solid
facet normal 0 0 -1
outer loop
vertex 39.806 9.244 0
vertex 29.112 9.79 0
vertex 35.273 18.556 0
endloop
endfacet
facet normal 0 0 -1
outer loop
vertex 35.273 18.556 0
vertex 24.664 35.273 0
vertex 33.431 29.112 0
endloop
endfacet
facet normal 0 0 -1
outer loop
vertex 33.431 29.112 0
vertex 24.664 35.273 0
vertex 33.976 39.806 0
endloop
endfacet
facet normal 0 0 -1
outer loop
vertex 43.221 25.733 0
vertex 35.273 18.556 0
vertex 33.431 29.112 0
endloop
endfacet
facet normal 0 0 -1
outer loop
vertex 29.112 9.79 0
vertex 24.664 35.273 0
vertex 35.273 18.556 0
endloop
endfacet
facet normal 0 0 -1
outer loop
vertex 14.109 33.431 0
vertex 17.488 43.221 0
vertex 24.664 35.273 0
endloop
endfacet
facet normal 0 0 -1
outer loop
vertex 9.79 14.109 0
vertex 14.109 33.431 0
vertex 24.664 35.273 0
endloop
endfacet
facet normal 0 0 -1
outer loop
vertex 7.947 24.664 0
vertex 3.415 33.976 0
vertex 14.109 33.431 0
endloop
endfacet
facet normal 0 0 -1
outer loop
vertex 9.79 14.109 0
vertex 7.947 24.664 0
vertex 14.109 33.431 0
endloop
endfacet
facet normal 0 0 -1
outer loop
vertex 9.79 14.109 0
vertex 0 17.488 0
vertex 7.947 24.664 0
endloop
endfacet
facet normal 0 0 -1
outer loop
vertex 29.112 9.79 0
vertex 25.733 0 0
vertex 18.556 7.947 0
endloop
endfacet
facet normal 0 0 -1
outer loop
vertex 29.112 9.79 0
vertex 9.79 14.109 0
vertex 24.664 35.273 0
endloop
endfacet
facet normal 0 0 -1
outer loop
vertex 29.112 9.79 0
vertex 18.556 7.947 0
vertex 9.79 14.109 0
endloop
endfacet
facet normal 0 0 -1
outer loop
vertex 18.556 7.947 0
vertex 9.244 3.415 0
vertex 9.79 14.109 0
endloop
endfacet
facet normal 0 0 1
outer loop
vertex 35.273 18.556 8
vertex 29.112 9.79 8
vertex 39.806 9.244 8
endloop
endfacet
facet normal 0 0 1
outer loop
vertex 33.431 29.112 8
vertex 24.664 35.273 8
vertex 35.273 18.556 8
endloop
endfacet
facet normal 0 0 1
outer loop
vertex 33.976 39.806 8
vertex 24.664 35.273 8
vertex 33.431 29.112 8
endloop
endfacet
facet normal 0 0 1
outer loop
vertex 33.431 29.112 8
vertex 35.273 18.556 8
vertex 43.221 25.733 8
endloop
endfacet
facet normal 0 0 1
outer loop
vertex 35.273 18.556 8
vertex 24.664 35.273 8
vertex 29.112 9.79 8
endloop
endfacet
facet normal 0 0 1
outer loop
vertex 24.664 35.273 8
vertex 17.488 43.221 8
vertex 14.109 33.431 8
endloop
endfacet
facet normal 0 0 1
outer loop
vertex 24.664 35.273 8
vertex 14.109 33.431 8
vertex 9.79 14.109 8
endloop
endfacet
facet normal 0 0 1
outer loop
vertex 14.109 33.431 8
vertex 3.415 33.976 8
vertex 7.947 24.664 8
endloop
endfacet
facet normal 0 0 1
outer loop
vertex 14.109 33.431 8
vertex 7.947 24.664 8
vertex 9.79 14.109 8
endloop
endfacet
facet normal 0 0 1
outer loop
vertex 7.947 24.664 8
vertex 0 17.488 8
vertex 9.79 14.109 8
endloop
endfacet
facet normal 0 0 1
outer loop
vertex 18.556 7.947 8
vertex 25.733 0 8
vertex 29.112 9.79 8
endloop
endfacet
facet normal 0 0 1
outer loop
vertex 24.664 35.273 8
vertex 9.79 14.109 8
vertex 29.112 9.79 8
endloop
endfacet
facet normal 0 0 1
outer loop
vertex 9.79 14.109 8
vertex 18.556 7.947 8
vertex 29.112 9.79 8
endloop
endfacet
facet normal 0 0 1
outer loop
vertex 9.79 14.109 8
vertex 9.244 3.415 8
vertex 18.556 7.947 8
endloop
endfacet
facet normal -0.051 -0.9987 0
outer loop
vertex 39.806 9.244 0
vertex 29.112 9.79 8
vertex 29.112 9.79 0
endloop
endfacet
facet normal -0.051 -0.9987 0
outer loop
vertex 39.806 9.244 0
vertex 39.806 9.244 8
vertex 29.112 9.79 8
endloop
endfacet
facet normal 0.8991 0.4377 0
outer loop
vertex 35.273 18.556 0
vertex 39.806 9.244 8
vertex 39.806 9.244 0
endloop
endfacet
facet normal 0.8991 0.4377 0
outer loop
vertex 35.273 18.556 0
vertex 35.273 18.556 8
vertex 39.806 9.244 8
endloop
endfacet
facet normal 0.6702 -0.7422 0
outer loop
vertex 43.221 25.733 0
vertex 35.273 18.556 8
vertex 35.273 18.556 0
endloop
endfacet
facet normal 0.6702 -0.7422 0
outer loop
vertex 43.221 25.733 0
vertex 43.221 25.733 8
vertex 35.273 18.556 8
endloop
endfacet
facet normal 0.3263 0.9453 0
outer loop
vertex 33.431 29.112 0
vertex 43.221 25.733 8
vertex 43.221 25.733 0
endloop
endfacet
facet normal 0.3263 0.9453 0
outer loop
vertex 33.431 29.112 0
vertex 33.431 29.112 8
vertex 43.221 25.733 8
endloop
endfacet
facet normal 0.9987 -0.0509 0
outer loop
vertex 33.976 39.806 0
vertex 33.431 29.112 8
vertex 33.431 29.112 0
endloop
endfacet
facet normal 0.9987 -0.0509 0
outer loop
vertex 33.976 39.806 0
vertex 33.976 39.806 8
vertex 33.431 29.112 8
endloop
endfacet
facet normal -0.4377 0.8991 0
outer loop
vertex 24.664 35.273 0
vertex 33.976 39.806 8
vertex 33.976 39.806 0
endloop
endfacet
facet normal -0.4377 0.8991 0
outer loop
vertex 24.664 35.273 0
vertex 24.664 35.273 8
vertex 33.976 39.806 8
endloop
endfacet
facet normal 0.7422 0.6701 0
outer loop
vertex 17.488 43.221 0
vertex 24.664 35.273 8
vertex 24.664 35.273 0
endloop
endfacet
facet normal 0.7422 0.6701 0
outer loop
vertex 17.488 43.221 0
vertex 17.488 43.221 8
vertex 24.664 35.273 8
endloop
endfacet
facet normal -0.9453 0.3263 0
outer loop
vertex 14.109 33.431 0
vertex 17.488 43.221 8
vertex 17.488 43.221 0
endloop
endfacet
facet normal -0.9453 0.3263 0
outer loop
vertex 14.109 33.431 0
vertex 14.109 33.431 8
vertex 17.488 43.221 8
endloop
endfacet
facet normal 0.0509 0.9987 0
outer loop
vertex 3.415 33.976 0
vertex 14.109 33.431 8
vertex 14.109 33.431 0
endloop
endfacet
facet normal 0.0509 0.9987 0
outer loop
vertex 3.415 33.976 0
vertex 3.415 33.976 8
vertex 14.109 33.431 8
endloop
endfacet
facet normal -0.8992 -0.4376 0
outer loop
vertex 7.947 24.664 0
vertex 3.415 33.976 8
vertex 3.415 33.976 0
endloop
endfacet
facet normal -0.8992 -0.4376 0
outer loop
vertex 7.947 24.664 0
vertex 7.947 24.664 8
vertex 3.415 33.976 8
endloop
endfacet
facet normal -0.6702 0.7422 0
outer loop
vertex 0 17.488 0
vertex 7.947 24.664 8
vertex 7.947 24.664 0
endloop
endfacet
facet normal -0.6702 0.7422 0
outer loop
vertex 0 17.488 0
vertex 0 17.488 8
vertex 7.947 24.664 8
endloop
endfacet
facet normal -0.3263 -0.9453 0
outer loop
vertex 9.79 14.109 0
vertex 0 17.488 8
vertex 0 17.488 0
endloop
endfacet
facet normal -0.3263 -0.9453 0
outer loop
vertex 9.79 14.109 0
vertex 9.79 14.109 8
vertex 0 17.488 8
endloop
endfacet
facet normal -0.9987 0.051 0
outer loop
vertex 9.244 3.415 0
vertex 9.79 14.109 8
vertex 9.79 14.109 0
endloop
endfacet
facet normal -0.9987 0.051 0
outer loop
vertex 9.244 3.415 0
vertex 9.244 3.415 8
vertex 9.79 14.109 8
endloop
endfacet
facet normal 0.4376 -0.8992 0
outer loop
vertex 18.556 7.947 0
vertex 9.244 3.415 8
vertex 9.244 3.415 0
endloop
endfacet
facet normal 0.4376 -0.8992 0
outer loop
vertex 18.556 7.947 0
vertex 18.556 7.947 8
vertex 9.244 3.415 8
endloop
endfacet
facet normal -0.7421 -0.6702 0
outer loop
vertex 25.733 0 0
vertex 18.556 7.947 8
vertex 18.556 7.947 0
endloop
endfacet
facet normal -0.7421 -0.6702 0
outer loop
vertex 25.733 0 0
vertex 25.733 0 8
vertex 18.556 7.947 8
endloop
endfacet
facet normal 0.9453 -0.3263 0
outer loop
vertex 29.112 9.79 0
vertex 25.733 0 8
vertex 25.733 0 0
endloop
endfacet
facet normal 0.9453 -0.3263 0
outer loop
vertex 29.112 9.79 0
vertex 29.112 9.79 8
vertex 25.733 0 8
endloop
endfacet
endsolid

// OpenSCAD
$fn = 32;

// ----------------------------------------------------------------------
// Chain sprocket: 8 teeth, 14 mm root radius
// ----------------------------------------------------------------------

// --- parameters (mm) ---
profile_height = 8;       // extrusion height
profile_points = 16;      // points of the closed outline

profile = [[35.273, 18.556], [43.221, 25.733], [33.431, 29.112], [33.976, 39.806], [24.664, 35.273], [17.488, 43.221], [14.109, 33.431], [3.415, 33.976], [7.947, 24.664], [0, 17.488], [9.79, 14.109], [9.244, 3.415], [18.556, 7.947], [25.733, 0], [29.112, 9.79], [39.806, 9.244]];  // single closed polygon, 16 points, counter clockwise

// --- the one profile operation ---
linear_extrude(height = profile_height) polygon(points = profile);
